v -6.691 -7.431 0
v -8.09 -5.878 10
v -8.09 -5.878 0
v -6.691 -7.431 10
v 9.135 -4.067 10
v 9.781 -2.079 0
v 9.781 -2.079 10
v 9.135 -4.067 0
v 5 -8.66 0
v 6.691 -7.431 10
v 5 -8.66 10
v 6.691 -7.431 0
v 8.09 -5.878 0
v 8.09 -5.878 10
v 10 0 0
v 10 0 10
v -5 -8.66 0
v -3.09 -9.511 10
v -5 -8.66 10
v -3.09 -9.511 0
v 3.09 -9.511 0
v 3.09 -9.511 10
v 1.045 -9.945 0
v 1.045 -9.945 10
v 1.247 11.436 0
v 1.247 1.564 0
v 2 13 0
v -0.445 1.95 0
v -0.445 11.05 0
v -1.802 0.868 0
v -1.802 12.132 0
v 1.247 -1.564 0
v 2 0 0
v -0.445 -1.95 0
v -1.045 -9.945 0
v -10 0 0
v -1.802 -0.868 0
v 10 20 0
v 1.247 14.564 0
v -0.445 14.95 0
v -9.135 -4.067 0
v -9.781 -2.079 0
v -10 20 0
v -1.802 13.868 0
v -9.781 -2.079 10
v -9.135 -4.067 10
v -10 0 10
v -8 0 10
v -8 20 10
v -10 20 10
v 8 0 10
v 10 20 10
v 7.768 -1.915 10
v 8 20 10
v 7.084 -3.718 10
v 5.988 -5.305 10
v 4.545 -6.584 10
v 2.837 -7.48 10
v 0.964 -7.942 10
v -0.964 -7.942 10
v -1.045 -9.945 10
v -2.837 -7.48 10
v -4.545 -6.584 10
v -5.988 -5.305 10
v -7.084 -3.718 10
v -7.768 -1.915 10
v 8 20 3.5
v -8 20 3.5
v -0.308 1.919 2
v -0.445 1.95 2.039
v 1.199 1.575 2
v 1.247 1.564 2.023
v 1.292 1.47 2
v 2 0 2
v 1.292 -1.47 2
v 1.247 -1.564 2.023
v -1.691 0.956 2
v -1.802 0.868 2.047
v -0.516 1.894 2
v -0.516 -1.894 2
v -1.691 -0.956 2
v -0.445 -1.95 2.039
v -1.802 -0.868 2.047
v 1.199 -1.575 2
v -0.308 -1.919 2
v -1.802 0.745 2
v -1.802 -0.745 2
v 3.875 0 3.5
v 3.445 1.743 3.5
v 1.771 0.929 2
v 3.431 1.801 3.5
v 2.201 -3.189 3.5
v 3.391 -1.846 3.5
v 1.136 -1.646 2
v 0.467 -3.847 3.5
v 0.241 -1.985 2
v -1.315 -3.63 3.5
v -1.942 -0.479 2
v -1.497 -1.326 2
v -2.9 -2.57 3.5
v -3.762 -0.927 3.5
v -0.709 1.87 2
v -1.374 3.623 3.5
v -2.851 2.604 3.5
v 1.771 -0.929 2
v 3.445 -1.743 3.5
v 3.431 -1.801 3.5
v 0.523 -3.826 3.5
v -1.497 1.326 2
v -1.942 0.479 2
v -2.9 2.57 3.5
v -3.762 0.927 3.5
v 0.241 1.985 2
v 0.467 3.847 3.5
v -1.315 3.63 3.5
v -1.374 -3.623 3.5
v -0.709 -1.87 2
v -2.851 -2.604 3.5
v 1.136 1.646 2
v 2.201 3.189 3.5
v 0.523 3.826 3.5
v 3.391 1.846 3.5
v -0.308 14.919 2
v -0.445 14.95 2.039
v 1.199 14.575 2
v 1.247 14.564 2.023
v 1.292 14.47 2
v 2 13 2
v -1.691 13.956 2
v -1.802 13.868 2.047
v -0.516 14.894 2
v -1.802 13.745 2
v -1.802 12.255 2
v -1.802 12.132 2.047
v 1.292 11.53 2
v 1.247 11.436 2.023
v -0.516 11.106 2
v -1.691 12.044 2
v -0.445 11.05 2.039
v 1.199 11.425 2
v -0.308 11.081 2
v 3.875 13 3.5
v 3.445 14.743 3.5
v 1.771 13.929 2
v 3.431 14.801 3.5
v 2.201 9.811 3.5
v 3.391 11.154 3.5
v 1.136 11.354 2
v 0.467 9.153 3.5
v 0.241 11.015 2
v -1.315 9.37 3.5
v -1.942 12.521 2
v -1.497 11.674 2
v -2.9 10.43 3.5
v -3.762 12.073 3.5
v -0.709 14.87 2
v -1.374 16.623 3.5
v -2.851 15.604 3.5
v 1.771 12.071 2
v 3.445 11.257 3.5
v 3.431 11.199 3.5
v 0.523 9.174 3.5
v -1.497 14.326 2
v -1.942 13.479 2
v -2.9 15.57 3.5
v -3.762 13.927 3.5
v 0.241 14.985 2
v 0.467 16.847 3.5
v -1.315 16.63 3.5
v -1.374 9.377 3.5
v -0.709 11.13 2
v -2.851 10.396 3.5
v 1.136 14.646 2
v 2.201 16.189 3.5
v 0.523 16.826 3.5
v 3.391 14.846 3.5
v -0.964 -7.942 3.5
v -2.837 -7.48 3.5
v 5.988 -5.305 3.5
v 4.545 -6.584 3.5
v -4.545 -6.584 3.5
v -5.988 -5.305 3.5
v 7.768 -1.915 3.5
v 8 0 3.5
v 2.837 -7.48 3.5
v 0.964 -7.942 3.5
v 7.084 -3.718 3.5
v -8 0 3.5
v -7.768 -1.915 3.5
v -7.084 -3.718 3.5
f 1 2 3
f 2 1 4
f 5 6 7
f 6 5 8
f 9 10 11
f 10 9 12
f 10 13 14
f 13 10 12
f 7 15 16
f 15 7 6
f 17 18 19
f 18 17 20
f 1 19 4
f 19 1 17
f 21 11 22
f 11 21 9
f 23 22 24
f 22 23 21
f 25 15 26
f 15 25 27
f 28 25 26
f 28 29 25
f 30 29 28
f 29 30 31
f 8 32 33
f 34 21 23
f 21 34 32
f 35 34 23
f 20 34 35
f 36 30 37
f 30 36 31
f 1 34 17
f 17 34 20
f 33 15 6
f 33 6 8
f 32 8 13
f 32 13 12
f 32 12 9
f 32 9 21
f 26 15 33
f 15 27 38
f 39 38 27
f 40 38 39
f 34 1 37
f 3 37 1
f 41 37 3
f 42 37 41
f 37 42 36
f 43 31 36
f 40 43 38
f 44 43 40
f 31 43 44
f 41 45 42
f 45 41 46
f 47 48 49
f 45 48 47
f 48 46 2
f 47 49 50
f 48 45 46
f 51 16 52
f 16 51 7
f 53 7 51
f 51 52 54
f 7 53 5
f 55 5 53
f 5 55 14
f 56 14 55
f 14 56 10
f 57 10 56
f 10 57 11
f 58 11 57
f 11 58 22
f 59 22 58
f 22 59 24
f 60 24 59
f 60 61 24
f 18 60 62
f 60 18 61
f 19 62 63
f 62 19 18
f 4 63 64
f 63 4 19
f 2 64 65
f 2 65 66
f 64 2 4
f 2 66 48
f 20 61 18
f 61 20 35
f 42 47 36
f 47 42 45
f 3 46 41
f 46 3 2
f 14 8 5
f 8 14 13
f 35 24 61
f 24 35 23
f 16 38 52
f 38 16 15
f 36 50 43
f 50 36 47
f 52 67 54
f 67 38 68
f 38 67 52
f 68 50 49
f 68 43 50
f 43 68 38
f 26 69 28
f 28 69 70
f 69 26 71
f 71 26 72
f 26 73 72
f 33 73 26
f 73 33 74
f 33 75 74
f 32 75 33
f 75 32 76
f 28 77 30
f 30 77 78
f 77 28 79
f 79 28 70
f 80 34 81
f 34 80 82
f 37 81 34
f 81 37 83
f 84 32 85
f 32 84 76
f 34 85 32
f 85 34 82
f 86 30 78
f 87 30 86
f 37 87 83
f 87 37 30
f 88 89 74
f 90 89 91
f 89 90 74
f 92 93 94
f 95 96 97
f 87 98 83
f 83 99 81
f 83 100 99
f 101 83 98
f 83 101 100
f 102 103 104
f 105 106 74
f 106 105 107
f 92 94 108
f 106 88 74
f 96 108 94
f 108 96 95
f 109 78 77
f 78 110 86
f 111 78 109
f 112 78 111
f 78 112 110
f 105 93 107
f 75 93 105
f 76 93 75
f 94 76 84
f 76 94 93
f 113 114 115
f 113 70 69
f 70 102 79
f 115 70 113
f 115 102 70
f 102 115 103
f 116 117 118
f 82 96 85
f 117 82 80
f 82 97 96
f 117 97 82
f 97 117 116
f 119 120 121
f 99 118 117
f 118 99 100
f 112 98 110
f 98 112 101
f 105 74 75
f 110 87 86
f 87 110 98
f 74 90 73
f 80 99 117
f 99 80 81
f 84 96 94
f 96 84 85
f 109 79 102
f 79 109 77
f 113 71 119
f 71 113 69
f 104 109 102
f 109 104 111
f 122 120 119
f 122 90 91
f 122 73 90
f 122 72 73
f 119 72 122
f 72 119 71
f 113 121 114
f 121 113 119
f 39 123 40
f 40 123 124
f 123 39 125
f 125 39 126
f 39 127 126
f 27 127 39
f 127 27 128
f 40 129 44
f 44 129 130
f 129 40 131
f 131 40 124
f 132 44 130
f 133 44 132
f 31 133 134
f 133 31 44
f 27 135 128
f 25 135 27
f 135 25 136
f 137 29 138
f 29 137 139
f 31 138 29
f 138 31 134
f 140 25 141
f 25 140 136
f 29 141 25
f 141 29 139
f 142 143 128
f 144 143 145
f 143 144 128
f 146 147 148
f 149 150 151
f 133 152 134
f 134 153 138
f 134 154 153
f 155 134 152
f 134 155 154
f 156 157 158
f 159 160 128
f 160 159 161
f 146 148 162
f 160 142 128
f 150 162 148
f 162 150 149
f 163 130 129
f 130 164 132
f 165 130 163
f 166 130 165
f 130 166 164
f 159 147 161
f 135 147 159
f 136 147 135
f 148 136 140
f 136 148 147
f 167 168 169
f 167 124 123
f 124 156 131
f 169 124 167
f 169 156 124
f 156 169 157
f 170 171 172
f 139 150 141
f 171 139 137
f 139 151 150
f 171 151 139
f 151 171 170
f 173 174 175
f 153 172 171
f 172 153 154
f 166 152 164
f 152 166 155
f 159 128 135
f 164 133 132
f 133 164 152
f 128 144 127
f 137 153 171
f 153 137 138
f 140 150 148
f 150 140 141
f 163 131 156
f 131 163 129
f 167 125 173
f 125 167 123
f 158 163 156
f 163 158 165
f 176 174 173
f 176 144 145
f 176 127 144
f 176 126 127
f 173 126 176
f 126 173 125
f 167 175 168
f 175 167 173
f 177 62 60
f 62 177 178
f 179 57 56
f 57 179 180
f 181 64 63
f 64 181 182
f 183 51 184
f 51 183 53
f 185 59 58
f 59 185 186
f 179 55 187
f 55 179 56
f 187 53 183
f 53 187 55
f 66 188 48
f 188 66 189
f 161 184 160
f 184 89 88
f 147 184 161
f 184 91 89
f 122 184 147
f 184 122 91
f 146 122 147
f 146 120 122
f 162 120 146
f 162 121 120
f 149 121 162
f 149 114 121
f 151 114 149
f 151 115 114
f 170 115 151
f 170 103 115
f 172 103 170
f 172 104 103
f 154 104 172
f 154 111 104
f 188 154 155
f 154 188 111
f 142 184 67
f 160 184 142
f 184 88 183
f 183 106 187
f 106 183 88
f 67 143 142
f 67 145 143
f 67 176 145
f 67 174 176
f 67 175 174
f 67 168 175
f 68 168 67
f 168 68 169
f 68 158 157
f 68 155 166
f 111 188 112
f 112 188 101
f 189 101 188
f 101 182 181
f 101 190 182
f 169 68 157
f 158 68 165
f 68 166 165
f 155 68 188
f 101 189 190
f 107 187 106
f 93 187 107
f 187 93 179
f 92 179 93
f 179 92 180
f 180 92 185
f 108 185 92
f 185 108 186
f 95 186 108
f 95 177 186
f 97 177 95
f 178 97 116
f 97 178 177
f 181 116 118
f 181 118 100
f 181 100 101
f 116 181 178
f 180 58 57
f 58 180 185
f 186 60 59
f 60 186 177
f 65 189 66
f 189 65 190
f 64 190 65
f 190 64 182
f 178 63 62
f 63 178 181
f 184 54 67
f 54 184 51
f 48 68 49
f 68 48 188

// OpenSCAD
difference() {
union() {
    cylinder(10,10,10);
    translate([-10,0,0])cube([20,20,10]);
}
translate([0,0,3.5]) {
    translate([0,0,-10])cylinder(20,2,2);
    translate([0,0,-1.5]) cylinder(1.6,2,4);
    translate([0,13,-10])cylinder(20,2,2);
    translate([0,13,-1.5]) cylinder(1.6,2,4);

    cylinder(10,8,8);
    translate([-8,0,0])cube([16,30,10]);
}
}
